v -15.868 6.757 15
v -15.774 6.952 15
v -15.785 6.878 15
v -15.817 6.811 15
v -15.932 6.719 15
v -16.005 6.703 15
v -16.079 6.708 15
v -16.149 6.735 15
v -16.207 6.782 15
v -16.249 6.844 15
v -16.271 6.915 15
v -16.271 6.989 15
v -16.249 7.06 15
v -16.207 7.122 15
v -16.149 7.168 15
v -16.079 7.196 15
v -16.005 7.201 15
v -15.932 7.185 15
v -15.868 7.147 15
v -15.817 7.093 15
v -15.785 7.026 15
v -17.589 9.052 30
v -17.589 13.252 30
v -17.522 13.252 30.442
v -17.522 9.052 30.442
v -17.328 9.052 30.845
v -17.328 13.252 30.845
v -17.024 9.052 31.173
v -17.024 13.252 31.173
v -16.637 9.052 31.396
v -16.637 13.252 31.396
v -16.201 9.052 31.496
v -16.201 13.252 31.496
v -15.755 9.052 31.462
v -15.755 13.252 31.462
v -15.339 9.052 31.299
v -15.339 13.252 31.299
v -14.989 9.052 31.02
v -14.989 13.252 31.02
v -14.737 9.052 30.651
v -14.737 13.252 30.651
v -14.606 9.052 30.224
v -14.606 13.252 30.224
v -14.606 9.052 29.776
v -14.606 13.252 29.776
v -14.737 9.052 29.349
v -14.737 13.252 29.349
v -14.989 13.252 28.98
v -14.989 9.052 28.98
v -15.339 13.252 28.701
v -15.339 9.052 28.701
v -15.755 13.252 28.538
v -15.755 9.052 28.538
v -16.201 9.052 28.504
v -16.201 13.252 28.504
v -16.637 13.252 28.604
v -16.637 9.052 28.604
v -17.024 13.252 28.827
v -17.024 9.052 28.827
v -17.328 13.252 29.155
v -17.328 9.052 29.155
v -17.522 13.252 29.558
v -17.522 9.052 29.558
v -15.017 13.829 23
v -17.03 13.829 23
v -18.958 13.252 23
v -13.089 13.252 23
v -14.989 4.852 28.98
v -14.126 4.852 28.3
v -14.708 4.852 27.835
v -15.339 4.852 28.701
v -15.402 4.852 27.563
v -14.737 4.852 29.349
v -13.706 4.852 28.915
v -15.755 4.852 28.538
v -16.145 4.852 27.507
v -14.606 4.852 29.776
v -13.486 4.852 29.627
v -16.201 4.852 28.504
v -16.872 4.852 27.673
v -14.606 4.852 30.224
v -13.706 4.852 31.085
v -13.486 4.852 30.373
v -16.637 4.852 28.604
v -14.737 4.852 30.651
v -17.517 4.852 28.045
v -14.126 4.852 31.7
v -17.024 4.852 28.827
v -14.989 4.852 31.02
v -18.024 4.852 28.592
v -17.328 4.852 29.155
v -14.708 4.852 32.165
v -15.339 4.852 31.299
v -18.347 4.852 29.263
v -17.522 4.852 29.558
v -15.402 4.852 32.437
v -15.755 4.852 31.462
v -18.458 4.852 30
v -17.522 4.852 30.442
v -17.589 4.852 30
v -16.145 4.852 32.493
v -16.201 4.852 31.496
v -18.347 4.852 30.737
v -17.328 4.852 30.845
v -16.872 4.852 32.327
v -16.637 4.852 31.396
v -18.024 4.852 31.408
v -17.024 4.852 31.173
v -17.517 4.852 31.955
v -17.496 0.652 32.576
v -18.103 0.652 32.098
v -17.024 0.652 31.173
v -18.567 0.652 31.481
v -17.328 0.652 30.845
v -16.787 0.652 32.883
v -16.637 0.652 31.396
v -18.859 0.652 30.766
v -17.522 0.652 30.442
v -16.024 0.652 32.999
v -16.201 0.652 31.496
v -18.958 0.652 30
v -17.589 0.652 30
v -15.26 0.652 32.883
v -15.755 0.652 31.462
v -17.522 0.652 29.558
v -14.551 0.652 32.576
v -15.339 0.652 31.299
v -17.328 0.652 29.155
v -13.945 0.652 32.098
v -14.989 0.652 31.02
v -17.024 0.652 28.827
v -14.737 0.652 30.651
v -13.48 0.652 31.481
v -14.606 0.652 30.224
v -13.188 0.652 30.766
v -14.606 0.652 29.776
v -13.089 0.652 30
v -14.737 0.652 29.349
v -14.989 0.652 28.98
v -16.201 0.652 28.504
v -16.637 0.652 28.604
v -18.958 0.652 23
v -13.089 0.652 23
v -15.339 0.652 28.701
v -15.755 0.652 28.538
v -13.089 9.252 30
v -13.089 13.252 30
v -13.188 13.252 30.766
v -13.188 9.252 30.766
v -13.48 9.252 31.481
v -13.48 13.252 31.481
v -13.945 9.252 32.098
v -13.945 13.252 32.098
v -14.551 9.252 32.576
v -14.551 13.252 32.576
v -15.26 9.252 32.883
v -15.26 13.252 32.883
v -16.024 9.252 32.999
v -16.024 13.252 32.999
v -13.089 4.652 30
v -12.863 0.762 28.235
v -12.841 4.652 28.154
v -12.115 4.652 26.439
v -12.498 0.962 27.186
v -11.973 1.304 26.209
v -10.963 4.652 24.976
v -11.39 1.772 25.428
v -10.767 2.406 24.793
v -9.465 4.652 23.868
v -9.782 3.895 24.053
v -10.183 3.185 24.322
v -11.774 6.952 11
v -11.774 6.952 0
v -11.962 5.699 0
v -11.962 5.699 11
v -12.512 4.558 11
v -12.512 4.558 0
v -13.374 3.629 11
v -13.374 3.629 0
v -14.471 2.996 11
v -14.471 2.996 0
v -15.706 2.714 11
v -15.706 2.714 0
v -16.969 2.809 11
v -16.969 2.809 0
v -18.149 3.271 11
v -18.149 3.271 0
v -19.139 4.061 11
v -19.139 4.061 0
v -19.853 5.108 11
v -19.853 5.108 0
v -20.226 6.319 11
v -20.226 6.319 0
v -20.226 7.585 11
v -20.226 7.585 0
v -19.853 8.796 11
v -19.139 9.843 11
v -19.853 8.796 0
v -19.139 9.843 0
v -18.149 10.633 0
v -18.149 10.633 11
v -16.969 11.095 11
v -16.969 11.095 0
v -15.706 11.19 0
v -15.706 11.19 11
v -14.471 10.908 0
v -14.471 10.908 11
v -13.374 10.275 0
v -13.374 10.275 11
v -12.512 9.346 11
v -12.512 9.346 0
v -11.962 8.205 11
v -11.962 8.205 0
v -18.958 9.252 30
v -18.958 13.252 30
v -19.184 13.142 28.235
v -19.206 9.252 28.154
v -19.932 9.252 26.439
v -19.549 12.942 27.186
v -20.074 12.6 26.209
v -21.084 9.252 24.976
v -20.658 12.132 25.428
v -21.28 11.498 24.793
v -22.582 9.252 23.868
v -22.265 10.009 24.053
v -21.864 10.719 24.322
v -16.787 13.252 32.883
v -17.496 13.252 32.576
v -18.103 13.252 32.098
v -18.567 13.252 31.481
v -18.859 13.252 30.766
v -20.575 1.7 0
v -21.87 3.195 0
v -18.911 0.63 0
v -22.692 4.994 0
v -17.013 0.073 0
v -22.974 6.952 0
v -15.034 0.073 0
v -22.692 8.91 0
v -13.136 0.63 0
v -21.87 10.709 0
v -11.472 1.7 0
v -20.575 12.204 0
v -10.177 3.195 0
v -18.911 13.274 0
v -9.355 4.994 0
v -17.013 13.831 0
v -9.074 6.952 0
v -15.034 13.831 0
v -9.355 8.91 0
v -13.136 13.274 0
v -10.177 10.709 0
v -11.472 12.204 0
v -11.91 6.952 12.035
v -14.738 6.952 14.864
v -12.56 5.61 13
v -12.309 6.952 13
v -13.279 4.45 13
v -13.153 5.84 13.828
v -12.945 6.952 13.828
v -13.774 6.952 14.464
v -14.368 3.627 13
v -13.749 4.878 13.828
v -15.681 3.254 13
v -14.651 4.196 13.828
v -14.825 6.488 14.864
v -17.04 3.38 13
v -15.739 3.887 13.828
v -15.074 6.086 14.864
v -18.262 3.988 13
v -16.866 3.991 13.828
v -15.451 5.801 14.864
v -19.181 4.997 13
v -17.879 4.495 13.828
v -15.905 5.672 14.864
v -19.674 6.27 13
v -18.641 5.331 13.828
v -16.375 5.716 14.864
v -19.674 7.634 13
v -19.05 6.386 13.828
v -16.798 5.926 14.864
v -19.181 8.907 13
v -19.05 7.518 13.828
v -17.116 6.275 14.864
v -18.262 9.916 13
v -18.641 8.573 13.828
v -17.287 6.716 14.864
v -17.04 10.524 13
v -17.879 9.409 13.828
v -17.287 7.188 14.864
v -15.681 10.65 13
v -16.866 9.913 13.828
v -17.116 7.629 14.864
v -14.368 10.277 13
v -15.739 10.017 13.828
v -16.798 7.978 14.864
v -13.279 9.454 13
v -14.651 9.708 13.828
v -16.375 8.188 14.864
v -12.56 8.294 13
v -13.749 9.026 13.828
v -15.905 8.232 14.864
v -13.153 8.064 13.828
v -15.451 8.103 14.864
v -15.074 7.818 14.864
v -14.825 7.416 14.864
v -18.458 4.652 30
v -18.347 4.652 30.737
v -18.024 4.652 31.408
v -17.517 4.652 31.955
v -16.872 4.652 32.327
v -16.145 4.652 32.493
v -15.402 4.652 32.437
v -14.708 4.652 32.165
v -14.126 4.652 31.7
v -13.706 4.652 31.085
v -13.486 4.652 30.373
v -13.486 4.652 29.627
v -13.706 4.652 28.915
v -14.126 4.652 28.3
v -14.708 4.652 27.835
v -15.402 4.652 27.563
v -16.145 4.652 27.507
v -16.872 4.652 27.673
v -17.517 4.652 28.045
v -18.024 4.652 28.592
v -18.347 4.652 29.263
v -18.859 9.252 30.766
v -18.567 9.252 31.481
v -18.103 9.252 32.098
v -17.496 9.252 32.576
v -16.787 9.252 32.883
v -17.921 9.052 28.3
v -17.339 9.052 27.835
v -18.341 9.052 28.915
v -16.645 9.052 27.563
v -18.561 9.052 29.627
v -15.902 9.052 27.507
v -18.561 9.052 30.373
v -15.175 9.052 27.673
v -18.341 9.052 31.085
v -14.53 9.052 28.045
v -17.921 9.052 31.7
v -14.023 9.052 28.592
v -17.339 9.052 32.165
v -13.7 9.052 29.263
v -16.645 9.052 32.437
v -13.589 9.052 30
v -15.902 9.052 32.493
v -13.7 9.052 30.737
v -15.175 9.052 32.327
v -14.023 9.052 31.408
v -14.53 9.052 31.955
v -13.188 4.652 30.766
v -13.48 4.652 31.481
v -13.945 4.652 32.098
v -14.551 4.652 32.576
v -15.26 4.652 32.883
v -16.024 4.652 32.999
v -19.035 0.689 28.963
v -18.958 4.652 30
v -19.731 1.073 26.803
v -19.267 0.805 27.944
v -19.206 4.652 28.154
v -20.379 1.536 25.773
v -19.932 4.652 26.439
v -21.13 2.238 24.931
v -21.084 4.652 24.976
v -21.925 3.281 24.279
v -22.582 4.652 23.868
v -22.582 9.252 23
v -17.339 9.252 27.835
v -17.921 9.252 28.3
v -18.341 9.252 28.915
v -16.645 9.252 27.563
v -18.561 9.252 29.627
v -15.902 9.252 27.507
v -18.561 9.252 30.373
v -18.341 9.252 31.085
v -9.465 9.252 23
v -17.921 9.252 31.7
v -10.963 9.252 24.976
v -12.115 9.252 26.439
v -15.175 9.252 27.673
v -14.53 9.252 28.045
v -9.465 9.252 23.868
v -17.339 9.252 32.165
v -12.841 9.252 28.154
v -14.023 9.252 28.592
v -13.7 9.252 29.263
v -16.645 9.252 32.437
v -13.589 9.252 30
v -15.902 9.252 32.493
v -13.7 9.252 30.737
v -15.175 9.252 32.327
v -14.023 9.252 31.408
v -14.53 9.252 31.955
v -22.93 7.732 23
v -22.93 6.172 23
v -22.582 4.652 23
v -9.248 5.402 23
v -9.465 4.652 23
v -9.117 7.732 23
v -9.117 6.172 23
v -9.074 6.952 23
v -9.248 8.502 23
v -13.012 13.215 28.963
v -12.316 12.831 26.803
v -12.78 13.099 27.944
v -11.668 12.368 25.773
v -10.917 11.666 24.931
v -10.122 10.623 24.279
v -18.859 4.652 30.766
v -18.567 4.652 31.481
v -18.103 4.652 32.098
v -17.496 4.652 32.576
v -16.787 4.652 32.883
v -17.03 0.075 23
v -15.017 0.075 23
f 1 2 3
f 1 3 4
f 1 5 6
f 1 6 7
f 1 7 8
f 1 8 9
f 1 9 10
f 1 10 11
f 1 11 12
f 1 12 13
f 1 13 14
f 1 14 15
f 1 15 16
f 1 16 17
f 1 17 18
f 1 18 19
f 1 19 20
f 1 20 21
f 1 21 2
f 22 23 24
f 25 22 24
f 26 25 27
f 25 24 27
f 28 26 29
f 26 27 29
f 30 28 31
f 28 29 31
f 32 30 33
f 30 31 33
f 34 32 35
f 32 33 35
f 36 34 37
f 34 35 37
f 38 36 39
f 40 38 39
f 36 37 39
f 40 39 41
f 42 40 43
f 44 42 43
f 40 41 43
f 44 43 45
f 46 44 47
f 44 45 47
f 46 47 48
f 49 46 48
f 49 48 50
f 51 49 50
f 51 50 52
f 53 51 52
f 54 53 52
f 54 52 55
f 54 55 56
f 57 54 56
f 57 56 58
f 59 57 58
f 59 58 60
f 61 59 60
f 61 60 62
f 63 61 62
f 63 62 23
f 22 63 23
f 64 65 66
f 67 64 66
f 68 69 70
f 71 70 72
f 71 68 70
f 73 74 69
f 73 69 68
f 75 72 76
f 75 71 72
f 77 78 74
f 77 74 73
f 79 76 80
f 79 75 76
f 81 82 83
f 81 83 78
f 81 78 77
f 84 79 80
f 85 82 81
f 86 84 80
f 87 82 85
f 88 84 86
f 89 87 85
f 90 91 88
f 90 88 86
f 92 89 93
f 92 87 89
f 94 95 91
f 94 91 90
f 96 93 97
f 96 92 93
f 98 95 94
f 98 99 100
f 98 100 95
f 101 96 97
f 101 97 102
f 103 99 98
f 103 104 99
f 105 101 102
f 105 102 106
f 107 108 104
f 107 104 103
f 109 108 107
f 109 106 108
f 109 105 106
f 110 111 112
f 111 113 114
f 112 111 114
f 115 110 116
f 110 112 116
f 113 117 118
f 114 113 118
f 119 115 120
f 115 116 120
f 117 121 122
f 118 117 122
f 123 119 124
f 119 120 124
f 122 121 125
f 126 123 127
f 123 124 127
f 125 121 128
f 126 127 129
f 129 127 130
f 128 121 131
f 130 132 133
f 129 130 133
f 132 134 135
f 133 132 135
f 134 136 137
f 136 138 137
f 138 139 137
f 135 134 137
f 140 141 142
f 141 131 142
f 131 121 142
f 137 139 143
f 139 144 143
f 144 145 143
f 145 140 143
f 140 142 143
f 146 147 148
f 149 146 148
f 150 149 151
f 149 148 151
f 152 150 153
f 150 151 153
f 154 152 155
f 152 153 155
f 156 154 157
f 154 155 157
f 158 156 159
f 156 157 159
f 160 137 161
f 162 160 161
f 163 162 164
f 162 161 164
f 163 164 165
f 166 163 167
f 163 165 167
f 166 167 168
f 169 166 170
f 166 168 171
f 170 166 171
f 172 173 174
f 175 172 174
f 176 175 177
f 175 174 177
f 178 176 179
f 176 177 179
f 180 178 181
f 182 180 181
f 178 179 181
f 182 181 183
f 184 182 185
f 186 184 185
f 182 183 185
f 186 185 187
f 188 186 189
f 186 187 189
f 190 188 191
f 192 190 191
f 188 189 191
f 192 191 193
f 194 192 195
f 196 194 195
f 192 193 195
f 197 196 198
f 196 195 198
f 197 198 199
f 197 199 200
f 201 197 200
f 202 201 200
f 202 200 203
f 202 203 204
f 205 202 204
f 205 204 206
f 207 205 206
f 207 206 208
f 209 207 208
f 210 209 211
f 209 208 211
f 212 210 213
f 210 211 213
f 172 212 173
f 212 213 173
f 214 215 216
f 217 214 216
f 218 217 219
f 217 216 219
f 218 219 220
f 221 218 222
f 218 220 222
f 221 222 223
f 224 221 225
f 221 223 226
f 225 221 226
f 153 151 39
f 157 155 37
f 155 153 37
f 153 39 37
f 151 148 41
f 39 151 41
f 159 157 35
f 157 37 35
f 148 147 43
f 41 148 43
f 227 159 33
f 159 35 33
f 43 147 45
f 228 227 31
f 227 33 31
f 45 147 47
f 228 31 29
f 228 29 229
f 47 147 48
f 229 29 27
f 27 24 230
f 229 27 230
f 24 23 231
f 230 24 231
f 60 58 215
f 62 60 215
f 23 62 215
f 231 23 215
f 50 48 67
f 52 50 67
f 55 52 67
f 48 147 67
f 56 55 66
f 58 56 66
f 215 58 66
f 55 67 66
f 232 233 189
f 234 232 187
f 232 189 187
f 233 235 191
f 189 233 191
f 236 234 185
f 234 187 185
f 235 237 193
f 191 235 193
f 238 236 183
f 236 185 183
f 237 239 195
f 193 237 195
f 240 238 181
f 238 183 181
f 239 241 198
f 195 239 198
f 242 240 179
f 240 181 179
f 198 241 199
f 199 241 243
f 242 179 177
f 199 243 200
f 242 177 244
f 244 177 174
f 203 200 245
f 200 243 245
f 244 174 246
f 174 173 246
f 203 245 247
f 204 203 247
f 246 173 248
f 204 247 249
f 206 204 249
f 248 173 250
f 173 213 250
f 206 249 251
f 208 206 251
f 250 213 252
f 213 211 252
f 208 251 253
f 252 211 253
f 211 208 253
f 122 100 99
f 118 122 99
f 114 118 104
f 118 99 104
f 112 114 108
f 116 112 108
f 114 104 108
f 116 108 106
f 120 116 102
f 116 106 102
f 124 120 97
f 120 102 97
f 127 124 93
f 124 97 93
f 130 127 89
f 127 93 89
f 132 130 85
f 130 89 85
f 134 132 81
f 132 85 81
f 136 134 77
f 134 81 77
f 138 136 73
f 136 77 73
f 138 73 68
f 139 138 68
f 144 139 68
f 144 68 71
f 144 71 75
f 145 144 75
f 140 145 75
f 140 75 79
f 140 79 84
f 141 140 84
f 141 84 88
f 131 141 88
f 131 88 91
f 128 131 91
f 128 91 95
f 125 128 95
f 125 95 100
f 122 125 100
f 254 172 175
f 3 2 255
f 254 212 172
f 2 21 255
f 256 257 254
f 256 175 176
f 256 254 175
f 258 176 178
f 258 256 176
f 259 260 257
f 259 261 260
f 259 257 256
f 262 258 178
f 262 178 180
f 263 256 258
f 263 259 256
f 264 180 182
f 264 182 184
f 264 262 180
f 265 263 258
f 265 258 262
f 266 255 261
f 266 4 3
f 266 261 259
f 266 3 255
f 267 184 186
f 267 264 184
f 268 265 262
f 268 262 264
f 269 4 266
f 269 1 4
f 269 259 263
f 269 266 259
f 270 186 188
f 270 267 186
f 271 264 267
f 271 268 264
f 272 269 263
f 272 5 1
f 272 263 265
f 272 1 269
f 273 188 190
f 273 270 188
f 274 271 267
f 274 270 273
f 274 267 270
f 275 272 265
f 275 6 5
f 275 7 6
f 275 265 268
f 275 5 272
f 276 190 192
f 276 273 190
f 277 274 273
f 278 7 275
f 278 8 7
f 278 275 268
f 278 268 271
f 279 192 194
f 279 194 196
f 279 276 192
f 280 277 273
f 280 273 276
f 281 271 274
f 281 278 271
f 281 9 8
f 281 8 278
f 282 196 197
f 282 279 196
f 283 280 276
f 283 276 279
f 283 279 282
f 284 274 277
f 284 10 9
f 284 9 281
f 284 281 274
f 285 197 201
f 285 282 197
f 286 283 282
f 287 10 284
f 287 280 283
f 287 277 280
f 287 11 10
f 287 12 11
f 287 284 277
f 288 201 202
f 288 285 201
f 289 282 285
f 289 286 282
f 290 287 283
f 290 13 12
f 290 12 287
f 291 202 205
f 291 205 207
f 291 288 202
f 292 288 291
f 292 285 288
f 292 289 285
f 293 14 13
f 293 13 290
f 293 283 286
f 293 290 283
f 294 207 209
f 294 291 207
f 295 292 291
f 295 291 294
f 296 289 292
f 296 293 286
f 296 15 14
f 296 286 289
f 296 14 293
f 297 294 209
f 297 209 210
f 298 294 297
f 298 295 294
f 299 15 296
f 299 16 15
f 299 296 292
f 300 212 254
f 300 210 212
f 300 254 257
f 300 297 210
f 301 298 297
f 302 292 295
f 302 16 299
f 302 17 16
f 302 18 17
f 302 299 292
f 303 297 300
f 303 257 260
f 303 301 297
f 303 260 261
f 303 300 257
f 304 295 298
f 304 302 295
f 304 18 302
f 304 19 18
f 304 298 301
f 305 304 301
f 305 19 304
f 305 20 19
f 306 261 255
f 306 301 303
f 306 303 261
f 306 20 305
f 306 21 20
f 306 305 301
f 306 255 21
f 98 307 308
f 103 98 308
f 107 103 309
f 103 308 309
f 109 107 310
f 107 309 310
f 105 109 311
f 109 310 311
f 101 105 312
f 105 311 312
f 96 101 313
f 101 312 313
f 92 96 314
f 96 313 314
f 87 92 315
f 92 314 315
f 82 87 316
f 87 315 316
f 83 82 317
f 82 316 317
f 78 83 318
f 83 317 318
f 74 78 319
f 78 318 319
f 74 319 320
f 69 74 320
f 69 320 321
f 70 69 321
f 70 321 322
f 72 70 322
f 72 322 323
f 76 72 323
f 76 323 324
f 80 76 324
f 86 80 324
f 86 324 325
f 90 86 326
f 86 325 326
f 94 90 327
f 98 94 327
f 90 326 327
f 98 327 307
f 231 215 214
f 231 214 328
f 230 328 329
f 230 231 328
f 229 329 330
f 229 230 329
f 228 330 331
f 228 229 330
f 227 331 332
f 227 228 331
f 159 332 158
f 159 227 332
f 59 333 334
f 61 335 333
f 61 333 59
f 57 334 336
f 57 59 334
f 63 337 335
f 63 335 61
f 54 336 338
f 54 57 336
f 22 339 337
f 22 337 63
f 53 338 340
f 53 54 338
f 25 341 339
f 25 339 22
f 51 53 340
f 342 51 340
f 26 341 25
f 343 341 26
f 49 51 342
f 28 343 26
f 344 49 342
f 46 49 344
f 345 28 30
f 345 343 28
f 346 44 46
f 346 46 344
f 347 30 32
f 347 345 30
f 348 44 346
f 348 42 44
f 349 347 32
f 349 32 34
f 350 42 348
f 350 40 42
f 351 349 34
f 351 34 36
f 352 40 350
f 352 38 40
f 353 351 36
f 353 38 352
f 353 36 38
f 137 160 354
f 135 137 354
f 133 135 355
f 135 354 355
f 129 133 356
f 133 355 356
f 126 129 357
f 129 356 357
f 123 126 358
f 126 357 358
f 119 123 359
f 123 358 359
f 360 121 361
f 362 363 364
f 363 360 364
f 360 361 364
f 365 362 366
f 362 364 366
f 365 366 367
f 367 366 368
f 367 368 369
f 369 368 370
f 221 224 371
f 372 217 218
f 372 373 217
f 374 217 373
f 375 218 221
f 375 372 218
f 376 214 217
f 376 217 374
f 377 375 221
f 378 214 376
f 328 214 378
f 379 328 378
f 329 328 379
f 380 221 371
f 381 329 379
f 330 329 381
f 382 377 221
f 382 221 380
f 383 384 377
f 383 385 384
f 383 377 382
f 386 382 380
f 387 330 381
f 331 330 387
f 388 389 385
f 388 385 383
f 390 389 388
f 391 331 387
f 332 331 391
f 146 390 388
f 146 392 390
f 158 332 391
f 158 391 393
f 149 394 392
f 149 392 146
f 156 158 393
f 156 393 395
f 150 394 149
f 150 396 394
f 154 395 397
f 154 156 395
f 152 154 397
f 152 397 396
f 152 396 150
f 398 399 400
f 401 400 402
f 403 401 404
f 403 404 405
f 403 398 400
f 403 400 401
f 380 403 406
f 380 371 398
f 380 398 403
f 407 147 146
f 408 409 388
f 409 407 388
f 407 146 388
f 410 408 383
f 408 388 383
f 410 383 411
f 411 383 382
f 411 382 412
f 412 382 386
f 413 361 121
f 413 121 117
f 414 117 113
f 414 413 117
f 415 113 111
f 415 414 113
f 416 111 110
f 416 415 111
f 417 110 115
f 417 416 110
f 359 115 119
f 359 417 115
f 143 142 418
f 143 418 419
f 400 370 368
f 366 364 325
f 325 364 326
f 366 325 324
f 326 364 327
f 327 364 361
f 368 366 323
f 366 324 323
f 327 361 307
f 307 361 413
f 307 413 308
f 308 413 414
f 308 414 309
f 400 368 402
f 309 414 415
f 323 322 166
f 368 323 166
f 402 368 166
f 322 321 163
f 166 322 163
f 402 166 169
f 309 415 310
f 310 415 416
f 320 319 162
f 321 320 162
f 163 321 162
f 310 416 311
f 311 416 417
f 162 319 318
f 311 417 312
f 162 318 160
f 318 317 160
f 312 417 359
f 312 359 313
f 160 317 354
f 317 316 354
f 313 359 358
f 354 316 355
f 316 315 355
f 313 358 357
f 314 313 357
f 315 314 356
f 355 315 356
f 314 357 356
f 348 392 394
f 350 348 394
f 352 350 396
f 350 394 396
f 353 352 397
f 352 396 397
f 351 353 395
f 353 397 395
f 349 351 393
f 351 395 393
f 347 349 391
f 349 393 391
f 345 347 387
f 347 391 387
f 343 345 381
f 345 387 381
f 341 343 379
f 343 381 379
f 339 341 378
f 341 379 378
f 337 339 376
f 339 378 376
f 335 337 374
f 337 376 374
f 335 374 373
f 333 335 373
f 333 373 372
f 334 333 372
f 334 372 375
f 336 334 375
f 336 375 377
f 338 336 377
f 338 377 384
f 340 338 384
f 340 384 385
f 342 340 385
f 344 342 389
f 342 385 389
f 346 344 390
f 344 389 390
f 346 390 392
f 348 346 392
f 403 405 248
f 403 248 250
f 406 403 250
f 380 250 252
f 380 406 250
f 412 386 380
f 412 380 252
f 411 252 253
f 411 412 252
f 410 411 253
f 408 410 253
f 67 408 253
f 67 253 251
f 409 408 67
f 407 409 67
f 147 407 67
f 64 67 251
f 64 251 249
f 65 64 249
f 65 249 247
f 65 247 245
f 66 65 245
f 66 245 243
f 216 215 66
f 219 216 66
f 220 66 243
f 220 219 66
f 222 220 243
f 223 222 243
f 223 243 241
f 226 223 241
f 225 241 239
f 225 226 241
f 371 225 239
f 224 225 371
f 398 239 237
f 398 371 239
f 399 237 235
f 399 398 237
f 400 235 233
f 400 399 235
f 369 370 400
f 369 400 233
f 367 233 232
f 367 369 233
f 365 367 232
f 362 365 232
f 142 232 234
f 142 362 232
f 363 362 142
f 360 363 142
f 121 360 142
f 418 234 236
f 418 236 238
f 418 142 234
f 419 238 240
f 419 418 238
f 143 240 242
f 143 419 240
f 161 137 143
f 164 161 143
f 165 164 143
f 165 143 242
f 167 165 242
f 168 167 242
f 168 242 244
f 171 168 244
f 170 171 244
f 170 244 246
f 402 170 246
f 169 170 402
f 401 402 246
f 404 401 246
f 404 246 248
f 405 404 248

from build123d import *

# Parameters (mm, degrees)
F0_R         = 6.95
F1_DEPTH     = 23
F2_W         = 2.9347061182
F2_H         = 4
F3_DEPTH     = 10
F4_T1_DEPTH  = 19
F4_T3_DEPTH  = 19
F5_T4_DEPTH  = 4
F5_S5_R      = 6.95
F5_T6_DEPTH  = 7
F5_T10_DEPTH = 4
F5_S11_R     = 6.95
F5_T12_DEPTH = 7
F5_T16_DEPTH = 4
F5_S17_R     = 6.95
F5_T18_DEPTH = 7
F5_T22_DEPTH = 4
F5_S23_R     = 6.95
F5_T24_DEPTH = 7
F6_R         = 4.25
F7_DEPTH     = 15
F8_R         = 4
F10_R        = 2.5
F11_DEPTH    = 0.2
F12_R        = 2.5
F13_DEPTH    = 0.2
F9_R         = 1.5
F14_DEPTH    = 13.2510001


# Not quite as in the source:
# - a fillet or chamfer that OpenCascade refuses, or shapes differently, is made with other operations: its cross-section is extruded or revolved along the edge and cut away or added


with BuildPart() as f1:
    # F0 (on Top) → F1 (new body)
    with BuildSketch(Plane.XY):
        with Locations((-16.023524542, 6.9519880981)):
            Circle(F0_R)
    extrude(amount=F1_DEPTH)

    # F2 (on face) → F3 (join)
    with BuildSketch(Plane.XY.offset(23)):
        with Locations((-17.490877601, 11.2519880981)):
            Rectangle(F2_W, F2_H)
        with Locations((-14.5561714829, 11.2519880981)):
            Rectangle(F2_W, F2_H)
        with Locations((-17.490877601, 2.6519880981)):
            Rectangle(F2_W, F2_H)
        with Locations((-14.5561714829, 2.6519880981)):
            Rectangle(F2_W, F2_H)
    extrude(amount=F3_DEPTH)

    # F4: fillet of radius 3 on 4 edges, made by hand

    # F4_s2 → F4_t1 (cut)
    with BuildSketch(Plane.XZ.offset(-12.1519880981)):
        with BuildLine():
            ThreePointArc((-13.0888184238, 30), (-13.9674980802, 32.1213203436), (-16.0888184238, 33))
            Line((-16.0888184238, 33), (-13.0888184238, 33))
            Line((-13.0888184238, 33), (-13.0888184238, 30))
        make_face()
        with BuildLine():
            ThreePointArc((-18.9582306601, 30), (-18.0795510037, 32.1213203436), (-15.9582306601, 33))
            Line((-15.9582306601, 33), (-18.9582306601, 33))
            Line((-18.9582306601, 33), (-18.9582306601, 30))
        make_face()
    extrude(amount=F4_T1_DEPTH, mode=Mode.SUBTRACT)

    # F4_s4 → F4_t3 (cut)
    with BuildSketch(Plane.XZ.offset(-20.7519880981)):
        with BuildLine():
            ThreePointArc((-13.0888184238, 30), (-13.9674980802, 32.1213203436), (-16.0888184238, 33))
            Line((-16.0888184238, 33), (-13.0888184238, 33))
            Line((-13.0888184238, 33), (-13.0888184238, 30))
        make_face()
        with BuildLine():
            ThreePointArc((-18.9582306601, 30), (-18.0795510037, 32.1213203436), (-15.9582306601, 33))
            Line((-15.9582306601, 33), (-18.9582306601, 33))
            Line((-18.9582306601, 33), (-18.9582306601, 30))
        make_face()
    extrude(amount=F4_T3_DEPTH, mode=Mode.SUBTRACT)

    # F5: fillet of radius 7 on 4 edges, made by hand


with BuildPart() as f5_tool2:
    # F5_s3 → F5_t4 (new body)
    with BuildSketch(Plane.XZ.offset(-0.6519880981)):
        with BuildLine():
            ThreePointArc((-13.0888184238, 30), (-11.0385658921, 25.0502525317), (-6.0888184238, 23))
            Line((-6.0888184238, 23), (-6.0888184238, 22.86))
            Line((-6.0888184238, 22.86), (-13.2288184238, 22.86))
            Line((-13.2288184238, 22.86), (-13.2288184238, 30))
            Line((-13.2288184238, 30), (-13.0888184238, 30))
        make_face()
    extrude(amount=-F5_T4_DEPTH)

    # F5_s5 → F5_t6 (intersect, symmetric)
    with BuildSketch(Plane.XY.offset(26.4)):
        with Locations((-16.023524542, 6.9519880981)):
            Circle(F5_S5_R)
    extrude(amount=F5_T6_DEPTH, both=True, mode=Mode.INTERSECT)


with BuildPart() as f1_1:
    add(f1.part)

    # F5_t1: union F5_tool2
    add(f5_tool2.part)


with BuildPart() as f5_tool8:
    # F5_s9 → F5_t10 (new body)
    with BuildSketch(Plane.XZ.offset(-9.2519880981)):
        with BuildLine():
            ThreePointArc((-13.0888184238, 30), (-11.0385658921, 25.0502525317), (-6.0888184238, 23))
            Line((-6.0888184238, 23), (-6.0888184238, 22.86))
            Line((-6.0888184238, 22.86), (-13.2288184238, 22.86))
            Line((-13.2288184238, 22.86), (-13.2288184238, 30))
            Line((-13.2288184238, 30), (-13.0888184238, 30))
        make_face()
    extrude(amount=-F5_T10_DEPTH)

    # F5_s11 → F5_t12 (intersect, symmetric)
    with BuildSketch(Plane.XY.offset(26.4)):
        with Locations((-16.023524542, 6.9519880981)):
            Circle(F5_S11_R)
    extrude(amount=F5_T12_DEPTH, both=True, mode=Mode.INTERSECT)


with BuildPart() as f1_2:
    add(f1_1.part)

    # F5_t7: union F5_tool8
    add(f5_tool8.part)


with BuildPart() as f5_tool14:
    # F5_s15 → F5_t16 (new body)
    with BuildSketch(Plane.XZ.offset(-13.2519880981)):
        with BuildLine():
            ThreePointArc((-18.9582306601, 30), (-21.0084831918, 25.0502525317), (-25.9582306601, 23))
            Line((-25.9582306601, 23), (-25.9582306601, 22.86))
            Line((-25.9582306601, 22.86), (-18.8182306601, 22.86))
            Line((-18.8182306601, 22.86), (-18.8182306601, 30))
            Line((-18.8182306601, 30), (-18.9582306601, 30))
        make_face()
    extrude(amount=F5_T16_DEPTH)

    # F5_s17 → F5_t18 (intersect, symmetric)
    with BuildSketch(Plane.XY.offset(26.4)):
        with Locations((-16.023524542, 6.9519880981)):
            Circle(F5_S17_R)
    extrude(amount=F5_T18_DEPTH, both=True, mode=Mode.INTERSECT)


with BuildPart() as f1_3:
    add(f1_2.part)

    # F5_t13: union F5_tool14
    add(f5_tool14.part)


with BuildPart() as f5_tool20:
    # F5_s21 → F5_t22 (new body)
    with BuildSketch(Plane.XZ.offset(-4.6519880981)):
        with BuildLine():
            ThreePointArc((-18.9582306601, 30), (-21.0084831918, 25.0502525317), (-25.9582306601, 23))
            Line((-25.9582306601, 23), (-25.9582306601, 22.86))
            Line((-25.9582306601, 22.86), (-18.8182306601, 22.86))
            Line((-18.8182306601, 22.86), (-18.8182306601, 30))
            Line((-18.8182306601, 30), (-18.9582306601, 30))
        make_face()
    extrude(amount=F5_T22_DEPTH)

    # F5_s23 → F5_t24 (intersect, symmetric)
    with BuildSketch(Plane.XY.offset(26.4)):
        with Locations((-16.023524542, 6.9519880981)):
            Circle(F5_S23_R)
    extrude(amount=F5_T24_DEPTH, both=True, mode=Mode.INTERSECT)


with BuildPart() as f1_4:
    add(f1_3.part)

    # F5_t19: union F5_tool20
    add(f5_tool20.part)

    # F6 (on face) → F7 (cut)
    with BuildSketch(Plane(origin=(0, 0, 0), x_dir=(1, 0, 0), z_dir=(0, 0, -1))):
        with Locations((-16.023524542, -6.9519880981)):
            Circle(F6_R)
    extrude(amount=-F7_DEPTH, mode=Mode.SUBTRACT)

    # F8
    f8_edges = [f1_4.edges().sort_by_distance(p)[0] for p in [
        (-20.273525, 6.951988, 15),
    ]]
    fillet(f8_edges, radius=F8_R)

    # F10 (on face) → F11 (join)
    with BuildSketch(Plane(origin=(0, 4.6519880981, 0), x_dir=(-1, 0, 0), z_dir=(0, 1, 0))):
        with Locations((15.9582306601, 30)):
            Circle(F10_R)
    extrude(amount=F11_DEPTH)

    # F12 (on face) → F13 (join)
    with BuildSketch(Plane.XZ.offset(-9.2519880981)):
        with Locations((-16.0888184238, 30)):
            Circle(F12_R)
    extrude(amount=F13_DEPTH)

    # F9 (on face) → F14 (cut, through all)
    with BuildSketch(Plane(origin=(0, 13.2519880981, 0), x_dir=(-1, 0, 0), z_dir=(0, 1, 0))):
        with Locations((16.0888184238, 30)):
            Circle(F9_R)
    extrude(amount=-F14_DEPTH, mode=Mode.SUBTRACT)


solid = f1_4.part
